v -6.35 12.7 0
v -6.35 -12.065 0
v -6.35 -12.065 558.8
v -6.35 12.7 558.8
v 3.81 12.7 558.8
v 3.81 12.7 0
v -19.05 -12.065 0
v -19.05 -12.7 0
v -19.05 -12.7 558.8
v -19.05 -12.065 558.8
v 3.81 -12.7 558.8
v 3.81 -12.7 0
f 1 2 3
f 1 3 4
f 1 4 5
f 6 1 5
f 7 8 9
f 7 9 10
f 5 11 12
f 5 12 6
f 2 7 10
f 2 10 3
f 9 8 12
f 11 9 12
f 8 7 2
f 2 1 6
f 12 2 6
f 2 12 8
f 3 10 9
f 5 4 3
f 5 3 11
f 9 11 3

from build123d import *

# Parameters (mm, degrees)
SKETCH1_W           = 12.7
SKETCH1_H           = 30.48
BOSS_EXTRUDE1_DEPTH = 558.8
SKETCH2_OUTSIDE_W   = 126.654
SKETCH2_OUTSIDE_H   = 144.434
SKETCH2_OUTSIDE_W_2 = 10.16
SKETCH2_OUTSIDE_H_2 = 25.4
CUT_EXTRUDE1_DEPTH  = 560.043844524
SKETCH3_W           = 12.7
SKETCH3_H           = 0.635
BOSS_EXTRUDE2_DEPTH = 558.8


with BuildPart() as part:
    # Sketch1 → Boss-Extrude1 (new body)
    with BuildSketch(Plane.XY):
        Rectangle(SKETCH1_W, SKETCH1_H)
    extrude(amount=BOSS_EXTRUDE1_DEPTH)

    # Sketch2 outside → Cut-Extrude1 (cut, through all)
    with BuildSketch(Plane.XY.offset(558.8)):
        Rectangle(SKETCH2_OUTSIDE_W, SKETCH2_OUTSIDE_H)
        with Locations((-1.27, 0)):
            Rectangle(SKETCH2_OUTSIDE_W_2, SKETCH2_OUTSIDE_H_2, mode=Mode.SUBTRACT)
    extrude(amount=-CUT_EXTRUDE1_DEPTH, mode=Mode.SUBTRACT)

    # Sketch3 → Boss-Extrude2 (add)
    with BuildSketch(Plane.XY):
        with Locations((-12.7, -12.3825)):
            Rectangle(SKETCH3_W, SKETCH3_H)
    extrude(amount=BOSS_EXTRUDE2_DEPTH)


solid = part.part
